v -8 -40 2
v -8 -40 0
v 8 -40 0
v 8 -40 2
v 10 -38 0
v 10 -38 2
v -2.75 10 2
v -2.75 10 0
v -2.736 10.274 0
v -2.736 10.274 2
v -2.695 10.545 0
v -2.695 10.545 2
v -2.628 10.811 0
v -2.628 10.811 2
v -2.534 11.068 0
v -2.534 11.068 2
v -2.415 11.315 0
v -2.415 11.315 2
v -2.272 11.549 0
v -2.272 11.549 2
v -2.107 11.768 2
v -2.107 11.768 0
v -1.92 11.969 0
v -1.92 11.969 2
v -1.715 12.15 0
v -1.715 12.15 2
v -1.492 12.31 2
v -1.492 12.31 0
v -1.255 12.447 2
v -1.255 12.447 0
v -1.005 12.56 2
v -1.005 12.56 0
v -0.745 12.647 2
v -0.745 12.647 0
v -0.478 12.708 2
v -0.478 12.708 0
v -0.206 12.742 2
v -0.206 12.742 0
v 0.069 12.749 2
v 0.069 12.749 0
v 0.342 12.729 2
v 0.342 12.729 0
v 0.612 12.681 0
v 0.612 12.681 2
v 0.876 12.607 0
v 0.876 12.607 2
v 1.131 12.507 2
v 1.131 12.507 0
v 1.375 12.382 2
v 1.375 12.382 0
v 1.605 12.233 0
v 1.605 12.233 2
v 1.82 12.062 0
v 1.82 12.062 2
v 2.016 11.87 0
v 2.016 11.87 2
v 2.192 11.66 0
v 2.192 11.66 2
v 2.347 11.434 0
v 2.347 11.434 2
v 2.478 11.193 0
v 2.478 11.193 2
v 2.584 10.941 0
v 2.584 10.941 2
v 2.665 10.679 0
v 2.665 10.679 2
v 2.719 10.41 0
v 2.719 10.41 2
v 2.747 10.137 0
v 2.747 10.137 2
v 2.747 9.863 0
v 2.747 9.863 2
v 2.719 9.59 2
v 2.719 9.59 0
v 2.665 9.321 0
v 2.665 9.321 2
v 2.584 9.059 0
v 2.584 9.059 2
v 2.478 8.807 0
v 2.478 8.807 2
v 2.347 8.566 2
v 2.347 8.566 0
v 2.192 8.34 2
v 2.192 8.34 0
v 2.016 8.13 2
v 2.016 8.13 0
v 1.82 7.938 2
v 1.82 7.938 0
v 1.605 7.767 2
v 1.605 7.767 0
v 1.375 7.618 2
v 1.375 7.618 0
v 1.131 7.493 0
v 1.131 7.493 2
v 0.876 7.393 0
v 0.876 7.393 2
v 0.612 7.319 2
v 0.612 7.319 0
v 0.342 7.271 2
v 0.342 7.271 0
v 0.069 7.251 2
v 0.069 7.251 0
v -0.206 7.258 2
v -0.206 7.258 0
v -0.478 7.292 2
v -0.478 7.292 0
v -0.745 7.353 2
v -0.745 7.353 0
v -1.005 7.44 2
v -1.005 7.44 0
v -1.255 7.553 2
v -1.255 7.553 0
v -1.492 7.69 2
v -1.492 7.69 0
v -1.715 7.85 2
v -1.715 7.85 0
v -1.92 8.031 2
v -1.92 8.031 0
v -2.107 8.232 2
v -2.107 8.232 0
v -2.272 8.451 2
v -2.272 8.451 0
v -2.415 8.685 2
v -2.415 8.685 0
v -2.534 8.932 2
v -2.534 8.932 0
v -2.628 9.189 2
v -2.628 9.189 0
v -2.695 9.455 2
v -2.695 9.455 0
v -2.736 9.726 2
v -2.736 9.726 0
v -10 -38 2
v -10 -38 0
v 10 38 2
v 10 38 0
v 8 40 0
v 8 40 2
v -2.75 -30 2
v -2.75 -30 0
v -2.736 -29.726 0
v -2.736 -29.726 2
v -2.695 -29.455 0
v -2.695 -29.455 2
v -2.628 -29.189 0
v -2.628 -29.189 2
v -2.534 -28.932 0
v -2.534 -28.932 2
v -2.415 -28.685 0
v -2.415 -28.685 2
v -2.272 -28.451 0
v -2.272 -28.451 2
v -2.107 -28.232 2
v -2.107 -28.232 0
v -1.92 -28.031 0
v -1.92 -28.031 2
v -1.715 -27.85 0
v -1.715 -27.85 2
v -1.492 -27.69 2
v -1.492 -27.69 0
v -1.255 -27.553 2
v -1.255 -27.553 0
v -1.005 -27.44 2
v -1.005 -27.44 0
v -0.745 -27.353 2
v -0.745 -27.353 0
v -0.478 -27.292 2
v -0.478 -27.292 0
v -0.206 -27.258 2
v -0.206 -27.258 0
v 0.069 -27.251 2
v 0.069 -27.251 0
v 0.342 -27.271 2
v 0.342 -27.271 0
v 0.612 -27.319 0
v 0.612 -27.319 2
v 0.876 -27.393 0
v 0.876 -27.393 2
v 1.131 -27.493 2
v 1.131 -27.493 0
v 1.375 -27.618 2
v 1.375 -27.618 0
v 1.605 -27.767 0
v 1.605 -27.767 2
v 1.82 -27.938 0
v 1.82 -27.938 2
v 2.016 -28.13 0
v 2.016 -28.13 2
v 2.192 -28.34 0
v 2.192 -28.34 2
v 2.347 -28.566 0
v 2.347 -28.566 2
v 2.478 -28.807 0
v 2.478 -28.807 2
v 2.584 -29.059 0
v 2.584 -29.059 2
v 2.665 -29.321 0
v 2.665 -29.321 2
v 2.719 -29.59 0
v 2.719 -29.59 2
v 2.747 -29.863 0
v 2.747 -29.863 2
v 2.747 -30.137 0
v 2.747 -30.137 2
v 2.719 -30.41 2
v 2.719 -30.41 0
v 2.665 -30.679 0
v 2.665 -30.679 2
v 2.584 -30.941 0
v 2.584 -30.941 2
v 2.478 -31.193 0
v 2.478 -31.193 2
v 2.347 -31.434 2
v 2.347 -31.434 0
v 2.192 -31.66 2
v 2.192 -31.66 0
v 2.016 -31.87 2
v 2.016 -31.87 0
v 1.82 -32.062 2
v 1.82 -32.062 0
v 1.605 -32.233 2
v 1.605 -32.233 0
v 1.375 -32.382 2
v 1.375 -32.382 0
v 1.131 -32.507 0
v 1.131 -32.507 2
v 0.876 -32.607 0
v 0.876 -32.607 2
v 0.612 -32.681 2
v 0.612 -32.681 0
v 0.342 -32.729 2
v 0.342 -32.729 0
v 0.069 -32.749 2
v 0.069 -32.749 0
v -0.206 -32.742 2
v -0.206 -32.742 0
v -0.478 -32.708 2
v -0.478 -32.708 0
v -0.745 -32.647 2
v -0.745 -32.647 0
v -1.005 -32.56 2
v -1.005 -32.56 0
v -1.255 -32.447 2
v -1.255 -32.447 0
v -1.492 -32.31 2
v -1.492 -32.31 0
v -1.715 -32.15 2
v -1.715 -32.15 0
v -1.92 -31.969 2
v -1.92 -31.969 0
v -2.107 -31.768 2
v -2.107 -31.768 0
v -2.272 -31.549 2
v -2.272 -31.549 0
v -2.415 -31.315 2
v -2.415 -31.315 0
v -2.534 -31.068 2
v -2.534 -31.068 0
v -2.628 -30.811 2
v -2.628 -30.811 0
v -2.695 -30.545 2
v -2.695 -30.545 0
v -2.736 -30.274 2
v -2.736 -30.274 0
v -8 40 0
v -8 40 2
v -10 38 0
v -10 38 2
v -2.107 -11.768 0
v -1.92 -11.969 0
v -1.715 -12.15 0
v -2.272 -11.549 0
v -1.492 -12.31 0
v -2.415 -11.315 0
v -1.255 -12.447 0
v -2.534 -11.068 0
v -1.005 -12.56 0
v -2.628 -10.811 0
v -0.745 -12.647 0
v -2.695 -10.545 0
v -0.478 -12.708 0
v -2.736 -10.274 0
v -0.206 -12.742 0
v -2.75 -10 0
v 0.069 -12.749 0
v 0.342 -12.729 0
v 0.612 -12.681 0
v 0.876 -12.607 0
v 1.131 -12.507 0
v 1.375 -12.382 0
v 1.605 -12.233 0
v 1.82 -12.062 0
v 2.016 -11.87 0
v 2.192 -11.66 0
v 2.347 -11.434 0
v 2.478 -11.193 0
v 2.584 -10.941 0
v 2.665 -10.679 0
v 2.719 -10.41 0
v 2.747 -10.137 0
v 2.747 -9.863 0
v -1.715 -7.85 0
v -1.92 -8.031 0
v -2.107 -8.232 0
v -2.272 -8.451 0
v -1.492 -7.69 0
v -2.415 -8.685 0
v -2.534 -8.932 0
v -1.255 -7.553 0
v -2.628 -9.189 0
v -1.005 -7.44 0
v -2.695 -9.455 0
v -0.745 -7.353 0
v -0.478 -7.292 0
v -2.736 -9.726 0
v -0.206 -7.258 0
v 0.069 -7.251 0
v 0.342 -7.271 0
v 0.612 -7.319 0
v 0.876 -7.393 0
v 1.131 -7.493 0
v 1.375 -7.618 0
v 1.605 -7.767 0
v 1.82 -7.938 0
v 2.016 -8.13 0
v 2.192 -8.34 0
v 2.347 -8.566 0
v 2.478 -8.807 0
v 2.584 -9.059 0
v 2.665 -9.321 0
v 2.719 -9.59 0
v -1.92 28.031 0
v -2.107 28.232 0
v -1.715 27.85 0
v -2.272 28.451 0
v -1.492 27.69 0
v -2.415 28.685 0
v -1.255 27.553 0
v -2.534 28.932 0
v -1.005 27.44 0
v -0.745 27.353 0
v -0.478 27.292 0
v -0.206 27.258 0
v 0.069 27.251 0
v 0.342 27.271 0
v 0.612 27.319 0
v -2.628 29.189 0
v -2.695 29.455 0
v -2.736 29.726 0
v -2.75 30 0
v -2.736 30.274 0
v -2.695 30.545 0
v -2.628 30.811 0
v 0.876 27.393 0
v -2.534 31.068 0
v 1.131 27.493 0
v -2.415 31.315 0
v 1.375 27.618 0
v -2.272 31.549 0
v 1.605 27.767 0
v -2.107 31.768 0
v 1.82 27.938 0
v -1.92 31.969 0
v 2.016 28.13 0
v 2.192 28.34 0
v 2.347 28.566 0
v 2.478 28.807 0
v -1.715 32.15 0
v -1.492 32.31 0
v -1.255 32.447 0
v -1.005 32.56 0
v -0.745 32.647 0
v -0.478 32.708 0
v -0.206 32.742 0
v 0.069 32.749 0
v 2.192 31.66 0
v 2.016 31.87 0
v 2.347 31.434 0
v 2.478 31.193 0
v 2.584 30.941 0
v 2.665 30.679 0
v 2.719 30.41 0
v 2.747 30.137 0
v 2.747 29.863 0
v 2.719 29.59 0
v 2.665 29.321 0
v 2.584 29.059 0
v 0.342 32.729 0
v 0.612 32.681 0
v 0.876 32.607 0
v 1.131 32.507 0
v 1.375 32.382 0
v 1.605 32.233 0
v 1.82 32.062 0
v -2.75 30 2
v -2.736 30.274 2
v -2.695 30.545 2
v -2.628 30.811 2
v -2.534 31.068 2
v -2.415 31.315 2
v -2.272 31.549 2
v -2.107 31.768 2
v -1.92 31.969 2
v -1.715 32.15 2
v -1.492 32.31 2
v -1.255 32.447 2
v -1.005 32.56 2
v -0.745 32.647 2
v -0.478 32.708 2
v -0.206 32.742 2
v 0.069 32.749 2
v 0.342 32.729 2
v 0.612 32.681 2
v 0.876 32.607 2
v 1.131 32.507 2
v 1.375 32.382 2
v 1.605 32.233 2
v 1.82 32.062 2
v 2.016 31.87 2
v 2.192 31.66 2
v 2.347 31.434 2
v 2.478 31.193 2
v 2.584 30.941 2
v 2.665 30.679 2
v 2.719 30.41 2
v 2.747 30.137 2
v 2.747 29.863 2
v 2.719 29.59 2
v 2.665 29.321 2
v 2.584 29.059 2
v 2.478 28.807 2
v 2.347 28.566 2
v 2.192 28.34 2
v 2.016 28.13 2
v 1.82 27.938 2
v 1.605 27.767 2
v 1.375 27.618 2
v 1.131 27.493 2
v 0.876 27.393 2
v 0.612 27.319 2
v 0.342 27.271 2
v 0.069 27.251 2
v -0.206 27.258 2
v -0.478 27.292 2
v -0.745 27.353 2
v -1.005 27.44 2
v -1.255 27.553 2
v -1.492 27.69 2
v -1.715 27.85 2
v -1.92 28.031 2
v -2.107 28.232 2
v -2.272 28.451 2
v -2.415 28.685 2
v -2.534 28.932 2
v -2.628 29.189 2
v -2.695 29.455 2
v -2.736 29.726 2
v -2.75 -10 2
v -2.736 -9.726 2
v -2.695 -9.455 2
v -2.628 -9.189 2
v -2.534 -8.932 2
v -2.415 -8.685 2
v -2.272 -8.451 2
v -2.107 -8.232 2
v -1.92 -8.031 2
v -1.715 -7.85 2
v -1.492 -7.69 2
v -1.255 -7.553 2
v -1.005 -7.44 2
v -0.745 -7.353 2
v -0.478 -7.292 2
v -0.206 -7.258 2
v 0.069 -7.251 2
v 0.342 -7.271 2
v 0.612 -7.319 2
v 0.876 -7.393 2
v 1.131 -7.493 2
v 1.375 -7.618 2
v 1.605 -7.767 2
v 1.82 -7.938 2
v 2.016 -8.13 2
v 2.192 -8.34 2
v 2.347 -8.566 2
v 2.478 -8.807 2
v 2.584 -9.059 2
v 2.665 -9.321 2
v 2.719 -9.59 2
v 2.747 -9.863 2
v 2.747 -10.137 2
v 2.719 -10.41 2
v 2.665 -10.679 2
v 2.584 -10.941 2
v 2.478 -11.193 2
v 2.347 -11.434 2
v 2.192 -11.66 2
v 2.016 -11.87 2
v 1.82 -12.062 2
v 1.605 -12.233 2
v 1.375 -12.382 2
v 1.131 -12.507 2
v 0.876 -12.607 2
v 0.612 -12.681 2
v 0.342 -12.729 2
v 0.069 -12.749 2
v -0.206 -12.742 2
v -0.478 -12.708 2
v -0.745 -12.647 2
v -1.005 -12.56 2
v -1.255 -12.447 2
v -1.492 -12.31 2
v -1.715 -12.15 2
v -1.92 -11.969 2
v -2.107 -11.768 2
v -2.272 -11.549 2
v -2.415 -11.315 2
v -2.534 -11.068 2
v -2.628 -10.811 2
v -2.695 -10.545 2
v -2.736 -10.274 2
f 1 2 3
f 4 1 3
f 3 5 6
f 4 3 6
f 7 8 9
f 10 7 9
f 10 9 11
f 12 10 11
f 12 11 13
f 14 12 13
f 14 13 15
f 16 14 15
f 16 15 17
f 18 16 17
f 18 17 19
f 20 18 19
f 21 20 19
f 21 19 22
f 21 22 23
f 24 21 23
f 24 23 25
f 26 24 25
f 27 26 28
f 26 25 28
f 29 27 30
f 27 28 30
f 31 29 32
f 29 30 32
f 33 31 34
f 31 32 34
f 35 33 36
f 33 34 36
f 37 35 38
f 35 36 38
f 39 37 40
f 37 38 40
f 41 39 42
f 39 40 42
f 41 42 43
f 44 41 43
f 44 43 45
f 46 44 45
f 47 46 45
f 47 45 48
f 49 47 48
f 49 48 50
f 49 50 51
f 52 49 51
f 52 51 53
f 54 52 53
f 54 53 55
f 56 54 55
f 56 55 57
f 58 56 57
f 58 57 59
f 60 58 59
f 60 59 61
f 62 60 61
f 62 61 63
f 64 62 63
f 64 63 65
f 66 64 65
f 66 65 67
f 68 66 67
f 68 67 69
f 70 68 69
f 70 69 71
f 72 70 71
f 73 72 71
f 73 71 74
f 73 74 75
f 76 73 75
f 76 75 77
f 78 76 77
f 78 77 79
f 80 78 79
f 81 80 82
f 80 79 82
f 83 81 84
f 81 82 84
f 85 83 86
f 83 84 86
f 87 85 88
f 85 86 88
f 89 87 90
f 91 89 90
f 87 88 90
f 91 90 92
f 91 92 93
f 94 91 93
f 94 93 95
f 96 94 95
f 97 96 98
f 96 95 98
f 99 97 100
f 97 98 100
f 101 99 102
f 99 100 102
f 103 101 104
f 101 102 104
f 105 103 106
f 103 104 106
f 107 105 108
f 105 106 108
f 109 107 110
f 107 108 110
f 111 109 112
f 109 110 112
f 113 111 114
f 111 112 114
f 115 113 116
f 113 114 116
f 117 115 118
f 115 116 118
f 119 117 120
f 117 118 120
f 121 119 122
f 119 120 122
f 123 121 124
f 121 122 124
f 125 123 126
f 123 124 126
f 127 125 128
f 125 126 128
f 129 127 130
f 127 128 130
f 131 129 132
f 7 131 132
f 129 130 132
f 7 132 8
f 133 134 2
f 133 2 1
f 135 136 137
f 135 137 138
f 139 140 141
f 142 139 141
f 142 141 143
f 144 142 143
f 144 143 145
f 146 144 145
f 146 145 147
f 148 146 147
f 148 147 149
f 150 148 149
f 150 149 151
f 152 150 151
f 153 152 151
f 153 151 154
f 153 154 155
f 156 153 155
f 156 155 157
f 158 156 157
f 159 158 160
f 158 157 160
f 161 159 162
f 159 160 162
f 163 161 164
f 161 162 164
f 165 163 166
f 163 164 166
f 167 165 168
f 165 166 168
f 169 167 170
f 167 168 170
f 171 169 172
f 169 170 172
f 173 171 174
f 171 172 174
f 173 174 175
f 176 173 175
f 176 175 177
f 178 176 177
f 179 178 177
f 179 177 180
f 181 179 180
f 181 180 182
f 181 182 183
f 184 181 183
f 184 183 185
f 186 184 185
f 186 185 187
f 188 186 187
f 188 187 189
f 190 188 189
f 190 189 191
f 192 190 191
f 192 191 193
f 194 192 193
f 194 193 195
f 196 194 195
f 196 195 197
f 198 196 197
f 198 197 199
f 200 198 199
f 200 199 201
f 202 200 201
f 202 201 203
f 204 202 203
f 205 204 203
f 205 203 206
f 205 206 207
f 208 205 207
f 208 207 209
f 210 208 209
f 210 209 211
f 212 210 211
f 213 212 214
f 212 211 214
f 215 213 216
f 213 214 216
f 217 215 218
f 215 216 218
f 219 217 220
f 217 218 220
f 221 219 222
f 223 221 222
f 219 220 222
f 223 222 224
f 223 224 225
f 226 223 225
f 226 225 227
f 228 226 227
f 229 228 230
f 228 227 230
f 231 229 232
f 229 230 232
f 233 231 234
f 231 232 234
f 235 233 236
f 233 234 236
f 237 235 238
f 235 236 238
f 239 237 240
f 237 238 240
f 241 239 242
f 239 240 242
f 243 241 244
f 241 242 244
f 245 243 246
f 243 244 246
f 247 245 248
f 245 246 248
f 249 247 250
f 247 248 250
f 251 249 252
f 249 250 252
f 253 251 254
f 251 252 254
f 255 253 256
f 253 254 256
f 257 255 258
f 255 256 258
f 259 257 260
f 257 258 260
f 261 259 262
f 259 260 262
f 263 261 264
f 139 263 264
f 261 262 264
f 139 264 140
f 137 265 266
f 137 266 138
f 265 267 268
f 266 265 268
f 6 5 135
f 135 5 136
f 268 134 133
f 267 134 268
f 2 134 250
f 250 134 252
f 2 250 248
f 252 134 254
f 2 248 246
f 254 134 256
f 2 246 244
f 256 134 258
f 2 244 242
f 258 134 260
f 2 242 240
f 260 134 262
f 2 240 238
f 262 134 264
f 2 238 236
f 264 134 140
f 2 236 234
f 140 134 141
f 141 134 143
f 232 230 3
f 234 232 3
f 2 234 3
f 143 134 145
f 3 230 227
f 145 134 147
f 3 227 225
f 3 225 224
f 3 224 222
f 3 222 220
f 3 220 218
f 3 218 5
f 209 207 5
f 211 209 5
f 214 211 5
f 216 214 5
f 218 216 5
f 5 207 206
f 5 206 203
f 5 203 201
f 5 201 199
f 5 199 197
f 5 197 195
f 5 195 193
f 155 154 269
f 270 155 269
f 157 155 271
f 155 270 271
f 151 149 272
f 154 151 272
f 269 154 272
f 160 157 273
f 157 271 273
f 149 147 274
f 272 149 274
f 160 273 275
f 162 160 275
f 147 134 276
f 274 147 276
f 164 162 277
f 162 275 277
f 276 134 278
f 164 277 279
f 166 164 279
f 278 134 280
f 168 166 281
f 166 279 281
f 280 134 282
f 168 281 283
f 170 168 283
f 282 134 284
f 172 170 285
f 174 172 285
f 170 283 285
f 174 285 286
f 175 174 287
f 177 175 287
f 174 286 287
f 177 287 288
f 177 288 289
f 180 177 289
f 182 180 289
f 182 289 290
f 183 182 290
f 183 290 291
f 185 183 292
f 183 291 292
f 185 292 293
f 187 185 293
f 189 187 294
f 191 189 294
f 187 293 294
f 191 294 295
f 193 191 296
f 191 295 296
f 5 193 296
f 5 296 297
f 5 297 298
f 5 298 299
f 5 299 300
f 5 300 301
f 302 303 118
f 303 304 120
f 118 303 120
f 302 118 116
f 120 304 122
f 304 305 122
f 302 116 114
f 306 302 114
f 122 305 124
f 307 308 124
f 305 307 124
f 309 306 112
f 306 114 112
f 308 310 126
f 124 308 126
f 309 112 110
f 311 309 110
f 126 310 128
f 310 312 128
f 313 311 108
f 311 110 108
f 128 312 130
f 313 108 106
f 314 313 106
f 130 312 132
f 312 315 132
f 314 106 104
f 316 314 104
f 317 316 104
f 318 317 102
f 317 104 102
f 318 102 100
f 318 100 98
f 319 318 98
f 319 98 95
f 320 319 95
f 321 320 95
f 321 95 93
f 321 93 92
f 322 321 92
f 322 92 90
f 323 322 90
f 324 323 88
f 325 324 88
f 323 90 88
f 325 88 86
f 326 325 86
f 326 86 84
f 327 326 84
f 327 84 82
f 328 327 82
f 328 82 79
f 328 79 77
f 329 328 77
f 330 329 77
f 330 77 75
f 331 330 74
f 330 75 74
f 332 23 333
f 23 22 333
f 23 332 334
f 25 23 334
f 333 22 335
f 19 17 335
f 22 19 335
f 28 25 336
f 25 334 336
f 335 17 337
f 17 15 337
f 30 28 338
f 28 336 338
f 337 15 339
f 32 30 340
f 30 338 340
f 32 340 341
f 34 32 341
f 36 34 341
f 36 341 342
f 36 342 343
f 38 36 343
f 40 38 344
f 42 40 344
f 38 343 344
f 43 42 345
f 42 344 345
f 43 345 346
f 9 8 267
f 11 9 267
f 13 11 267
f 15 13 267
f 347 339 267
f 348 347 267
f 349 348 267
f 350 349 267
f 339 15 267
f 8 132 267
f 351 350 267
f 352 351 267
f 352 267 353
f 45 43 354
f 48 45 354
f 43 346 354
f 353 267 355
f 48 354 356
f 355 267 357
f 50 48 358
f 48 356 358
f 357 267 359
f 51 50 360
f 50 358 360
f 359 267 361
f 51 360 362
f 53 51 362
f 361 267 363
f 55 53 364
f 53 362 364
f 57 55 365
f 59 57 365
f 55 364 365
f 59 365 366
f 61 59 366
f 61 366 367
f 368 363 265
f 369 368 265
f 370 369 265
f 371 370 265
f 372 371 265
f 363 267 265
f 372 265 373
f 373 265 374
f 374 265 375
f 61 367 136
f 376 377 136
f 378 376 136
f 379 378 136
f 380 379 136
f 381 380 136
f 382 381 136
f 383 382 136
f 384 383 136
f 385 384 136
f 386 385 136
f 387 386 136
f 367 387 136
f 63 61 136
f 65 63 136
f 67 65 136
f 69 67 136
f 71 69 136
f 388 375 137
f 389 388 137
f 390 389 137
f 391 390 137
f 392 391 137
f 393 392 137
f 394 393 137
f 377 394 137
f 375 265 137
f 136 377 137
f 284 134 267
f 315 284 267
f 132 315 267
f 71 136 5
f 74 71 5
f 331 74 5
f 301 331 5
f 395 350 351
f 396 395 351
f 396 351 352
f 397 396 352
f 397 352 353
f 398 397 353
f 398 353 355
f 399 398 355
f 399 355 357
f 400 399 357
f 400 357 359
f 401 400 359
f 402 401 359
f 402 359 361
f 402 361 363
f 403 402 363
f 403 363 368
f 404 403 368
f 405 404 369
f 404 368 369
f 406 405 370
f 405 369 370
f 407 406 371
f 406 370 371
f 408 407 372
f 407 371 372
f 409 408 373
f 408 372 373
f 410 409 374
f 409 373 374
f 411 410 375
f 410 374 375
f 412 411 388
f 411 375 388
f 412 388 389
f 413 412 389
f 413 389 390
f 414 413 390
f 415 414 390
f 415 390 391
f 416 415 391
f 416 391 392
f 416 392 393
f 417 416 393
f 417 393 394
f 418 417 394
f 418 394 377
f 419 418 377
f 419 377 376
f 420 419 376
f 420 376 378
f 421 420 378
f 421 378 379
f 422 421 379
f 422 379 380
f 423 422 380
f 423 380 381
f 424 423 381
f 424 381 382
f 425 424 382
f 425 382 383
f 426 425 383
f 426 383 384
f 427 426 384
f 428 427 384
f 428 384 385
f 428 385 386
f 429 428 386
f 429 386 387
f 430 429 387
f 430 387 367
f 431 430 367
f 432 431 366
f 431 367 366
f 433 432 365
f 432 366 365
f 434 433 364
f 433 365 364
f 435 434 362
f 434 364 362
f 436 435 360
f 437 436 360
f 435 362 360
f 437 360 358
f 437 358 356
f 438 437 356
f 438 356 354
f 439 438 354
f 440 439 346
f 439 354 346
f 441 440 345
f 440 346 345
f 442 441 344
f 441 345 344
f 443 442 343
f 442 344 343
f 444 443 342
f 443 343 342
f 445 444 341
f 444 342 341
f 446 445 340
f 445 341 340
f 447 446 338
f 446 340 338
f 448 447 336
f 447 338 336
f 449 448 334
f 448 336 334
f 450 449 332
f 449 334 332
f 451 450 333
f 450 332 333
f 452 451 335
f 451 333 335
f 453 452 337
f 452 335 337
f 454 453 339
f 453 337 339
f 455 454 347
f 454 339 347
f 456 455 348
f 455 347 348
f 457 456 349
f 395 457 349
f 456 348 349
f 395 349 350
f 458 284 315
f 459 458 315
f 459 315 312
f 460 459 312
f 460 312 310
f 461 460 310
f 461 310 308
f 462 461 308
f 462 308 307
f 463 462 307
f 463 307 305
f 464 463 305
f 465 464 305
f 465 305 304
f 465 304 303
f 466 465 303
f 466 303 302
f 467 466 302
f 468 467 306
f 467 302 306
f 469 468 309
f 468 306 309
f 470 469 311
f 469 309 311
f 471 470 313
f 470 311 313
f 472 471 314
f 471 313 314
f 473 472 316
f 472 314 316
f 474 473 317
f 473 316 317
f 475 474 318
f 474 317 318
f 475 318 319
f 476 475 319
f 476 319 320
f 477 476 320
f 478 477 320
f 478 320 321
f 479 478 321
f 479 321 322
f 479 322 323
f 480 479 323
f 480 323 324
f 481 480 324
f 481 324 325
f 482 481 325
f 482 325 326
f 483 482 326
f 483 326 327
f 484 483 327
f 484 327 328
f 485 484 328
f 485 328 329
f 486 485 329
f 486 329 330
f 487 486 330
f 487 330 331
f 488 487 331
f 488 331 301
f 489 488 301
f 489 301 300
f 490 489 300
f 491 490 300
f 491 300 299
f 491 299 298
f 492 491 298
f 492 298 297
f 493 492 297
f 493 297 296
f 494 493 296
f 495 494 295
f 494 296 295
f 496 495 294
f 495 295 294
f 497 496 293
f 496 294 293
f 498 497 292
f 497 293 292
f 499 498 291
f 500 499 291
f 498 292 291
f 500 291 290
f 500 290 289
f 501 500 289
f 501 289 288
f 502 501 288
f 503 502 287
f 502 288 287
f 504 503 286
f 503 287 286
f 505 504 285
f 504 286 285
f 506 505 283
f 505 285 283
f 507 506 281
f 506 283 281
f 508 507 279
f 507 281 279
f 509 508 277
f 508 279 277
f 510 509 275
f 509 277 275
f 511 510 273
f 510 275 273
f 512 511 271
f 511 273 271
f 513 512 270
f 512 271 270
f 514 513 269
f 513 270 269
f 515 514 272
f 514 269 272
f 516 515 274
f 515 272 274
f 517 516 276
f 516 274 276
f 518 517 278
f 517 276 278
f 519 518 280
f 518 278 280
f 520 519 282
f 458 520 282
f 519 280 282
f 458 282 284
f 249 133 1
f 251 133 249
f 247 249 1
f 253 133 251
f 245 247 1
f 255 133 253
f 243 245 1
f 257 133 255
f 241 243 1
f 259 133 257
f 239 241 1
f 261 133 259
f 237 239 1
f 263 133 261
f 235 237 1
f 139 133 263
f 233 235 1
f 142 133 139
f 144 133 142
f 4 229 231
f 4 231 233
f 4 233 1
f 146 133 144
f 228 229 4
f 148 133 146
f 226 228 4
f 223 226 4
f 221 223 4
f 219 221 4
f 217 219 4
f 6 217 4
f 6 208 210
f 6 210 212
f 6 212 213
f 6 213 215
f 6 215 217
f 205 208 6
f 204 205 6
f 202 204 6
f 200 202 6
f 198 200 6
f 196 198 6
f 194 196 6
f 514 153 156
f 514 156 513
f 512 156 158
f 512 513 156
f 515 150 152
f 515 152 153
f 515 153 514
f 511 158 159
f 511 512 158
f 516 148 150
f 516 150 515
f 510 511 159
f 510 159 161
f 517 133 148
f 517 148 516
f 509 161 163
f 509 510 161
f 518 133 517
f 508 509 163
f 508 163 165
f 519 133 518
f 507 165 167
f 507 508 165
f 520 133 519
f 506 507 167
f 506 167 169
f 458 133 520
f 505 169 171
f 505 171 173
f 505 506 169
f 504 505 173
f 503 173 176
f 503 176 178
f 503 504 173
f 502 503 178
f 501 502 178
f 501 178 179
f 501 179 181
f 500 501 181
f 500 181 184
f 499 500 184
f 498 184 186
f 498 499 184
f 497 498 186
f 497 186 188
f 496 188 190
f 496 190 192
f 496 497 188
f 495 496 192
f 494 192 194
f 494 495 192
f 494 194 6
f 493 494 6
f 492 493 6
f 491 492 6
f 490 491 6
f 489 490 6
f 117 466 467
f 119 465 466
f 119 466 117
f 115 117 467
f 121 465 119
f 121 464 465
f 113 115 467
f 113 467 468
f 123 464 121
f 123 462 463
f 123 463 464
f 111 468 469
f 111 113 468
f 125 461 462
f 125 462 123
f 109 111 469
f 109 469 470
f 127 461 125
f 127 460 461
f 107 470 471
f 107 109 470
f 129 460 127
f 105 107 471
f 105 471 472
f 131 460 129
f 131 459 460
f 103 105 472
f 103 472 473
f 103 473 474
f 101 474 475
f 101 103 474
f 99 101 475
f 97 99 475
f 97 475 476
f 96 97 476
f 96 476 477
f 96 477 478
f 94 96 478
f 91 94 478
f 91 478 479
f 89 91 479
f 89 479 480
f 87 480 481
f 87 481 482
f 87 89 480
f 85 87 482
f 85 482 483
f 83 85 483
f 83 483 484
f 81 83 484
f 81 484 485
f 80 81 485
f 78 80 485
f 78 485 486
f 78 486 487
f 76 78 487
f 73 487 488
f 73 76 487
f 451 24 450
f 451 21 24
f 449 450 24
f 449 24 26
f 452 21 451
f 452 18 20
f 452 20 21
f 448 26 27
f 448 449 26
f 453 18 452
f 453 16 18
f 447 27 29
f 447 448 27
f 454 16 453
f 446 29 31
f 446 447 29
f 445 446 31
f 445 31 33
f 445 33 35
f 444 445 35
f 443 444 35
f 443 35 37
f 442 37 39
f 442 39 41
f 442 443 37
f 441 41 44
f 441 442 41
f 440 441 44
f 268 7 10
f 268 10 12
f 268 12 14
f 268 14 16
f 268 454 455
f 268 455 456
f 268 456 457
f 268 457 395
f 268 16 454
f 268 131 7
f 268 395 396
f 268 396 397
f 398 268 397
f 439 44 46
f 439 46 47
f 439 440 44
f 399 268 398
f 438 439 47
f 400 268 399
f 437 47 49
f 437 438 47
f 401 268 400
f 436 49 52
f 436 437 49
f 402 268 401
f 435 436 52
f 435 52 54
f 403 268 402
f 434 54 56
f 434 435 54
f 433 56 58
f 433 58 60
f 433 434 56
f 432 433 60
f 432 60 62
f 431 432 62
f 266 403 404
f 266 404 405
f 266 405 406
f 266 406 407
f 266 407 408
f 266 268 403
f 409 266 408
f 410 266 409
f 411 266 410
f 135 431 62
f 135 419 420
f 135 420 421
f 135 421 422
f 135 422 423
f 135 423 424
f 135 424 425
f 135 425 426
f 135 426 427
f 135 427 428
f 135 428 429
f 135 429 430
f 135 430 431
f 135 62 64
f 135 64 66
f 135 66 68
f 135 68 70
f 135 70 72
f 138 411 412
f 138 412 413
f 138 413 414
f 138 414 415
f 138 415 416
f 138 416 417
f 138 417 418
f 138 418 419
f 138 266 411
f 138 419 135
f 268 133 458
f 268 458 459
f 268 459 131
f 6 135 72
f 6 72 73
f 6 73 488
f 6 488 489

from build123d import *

# Parameters (mm, degrees)
SKETCH_1_W        = 20
SKETCH_1_H        = 80
EXTRUDE_1_DEPTH   = 2
CHAMFER_1_SIZE    = 2
HOLE_WIZARD_M51_D = 5.5


with BuildPart() as part:
    # Эскиз1 → Бобышка-Вытянуть1 (new body)
    with BuildSketch(Plane.XY):
        Rectangle(SKETCH_1_W, SKETCH_1_H)
    extrude(amount=EXTRUDE_1_DEPTH)

    # Фаска1
    chamfer_1_edges = [part.edges().sort_by_distance(p)[0] for p in [
        (10, -40, 1),
        (-10, -40, 1),
        (-10, 40, 1),
        (10, 40, 1),
    ]]
    chamfer(chamfer_1_edges, length=CHAMFER_1_SIZE)

    # Отверстие с зазором M51 (through all)
    with Locations(Plane.XY.offset(2)):
        with Locations((0, -30), (0, 30), (0, 10), (0, -10)):
            Hole(HOLE_WIZARD_M51_D / 2)


solid = part.part
